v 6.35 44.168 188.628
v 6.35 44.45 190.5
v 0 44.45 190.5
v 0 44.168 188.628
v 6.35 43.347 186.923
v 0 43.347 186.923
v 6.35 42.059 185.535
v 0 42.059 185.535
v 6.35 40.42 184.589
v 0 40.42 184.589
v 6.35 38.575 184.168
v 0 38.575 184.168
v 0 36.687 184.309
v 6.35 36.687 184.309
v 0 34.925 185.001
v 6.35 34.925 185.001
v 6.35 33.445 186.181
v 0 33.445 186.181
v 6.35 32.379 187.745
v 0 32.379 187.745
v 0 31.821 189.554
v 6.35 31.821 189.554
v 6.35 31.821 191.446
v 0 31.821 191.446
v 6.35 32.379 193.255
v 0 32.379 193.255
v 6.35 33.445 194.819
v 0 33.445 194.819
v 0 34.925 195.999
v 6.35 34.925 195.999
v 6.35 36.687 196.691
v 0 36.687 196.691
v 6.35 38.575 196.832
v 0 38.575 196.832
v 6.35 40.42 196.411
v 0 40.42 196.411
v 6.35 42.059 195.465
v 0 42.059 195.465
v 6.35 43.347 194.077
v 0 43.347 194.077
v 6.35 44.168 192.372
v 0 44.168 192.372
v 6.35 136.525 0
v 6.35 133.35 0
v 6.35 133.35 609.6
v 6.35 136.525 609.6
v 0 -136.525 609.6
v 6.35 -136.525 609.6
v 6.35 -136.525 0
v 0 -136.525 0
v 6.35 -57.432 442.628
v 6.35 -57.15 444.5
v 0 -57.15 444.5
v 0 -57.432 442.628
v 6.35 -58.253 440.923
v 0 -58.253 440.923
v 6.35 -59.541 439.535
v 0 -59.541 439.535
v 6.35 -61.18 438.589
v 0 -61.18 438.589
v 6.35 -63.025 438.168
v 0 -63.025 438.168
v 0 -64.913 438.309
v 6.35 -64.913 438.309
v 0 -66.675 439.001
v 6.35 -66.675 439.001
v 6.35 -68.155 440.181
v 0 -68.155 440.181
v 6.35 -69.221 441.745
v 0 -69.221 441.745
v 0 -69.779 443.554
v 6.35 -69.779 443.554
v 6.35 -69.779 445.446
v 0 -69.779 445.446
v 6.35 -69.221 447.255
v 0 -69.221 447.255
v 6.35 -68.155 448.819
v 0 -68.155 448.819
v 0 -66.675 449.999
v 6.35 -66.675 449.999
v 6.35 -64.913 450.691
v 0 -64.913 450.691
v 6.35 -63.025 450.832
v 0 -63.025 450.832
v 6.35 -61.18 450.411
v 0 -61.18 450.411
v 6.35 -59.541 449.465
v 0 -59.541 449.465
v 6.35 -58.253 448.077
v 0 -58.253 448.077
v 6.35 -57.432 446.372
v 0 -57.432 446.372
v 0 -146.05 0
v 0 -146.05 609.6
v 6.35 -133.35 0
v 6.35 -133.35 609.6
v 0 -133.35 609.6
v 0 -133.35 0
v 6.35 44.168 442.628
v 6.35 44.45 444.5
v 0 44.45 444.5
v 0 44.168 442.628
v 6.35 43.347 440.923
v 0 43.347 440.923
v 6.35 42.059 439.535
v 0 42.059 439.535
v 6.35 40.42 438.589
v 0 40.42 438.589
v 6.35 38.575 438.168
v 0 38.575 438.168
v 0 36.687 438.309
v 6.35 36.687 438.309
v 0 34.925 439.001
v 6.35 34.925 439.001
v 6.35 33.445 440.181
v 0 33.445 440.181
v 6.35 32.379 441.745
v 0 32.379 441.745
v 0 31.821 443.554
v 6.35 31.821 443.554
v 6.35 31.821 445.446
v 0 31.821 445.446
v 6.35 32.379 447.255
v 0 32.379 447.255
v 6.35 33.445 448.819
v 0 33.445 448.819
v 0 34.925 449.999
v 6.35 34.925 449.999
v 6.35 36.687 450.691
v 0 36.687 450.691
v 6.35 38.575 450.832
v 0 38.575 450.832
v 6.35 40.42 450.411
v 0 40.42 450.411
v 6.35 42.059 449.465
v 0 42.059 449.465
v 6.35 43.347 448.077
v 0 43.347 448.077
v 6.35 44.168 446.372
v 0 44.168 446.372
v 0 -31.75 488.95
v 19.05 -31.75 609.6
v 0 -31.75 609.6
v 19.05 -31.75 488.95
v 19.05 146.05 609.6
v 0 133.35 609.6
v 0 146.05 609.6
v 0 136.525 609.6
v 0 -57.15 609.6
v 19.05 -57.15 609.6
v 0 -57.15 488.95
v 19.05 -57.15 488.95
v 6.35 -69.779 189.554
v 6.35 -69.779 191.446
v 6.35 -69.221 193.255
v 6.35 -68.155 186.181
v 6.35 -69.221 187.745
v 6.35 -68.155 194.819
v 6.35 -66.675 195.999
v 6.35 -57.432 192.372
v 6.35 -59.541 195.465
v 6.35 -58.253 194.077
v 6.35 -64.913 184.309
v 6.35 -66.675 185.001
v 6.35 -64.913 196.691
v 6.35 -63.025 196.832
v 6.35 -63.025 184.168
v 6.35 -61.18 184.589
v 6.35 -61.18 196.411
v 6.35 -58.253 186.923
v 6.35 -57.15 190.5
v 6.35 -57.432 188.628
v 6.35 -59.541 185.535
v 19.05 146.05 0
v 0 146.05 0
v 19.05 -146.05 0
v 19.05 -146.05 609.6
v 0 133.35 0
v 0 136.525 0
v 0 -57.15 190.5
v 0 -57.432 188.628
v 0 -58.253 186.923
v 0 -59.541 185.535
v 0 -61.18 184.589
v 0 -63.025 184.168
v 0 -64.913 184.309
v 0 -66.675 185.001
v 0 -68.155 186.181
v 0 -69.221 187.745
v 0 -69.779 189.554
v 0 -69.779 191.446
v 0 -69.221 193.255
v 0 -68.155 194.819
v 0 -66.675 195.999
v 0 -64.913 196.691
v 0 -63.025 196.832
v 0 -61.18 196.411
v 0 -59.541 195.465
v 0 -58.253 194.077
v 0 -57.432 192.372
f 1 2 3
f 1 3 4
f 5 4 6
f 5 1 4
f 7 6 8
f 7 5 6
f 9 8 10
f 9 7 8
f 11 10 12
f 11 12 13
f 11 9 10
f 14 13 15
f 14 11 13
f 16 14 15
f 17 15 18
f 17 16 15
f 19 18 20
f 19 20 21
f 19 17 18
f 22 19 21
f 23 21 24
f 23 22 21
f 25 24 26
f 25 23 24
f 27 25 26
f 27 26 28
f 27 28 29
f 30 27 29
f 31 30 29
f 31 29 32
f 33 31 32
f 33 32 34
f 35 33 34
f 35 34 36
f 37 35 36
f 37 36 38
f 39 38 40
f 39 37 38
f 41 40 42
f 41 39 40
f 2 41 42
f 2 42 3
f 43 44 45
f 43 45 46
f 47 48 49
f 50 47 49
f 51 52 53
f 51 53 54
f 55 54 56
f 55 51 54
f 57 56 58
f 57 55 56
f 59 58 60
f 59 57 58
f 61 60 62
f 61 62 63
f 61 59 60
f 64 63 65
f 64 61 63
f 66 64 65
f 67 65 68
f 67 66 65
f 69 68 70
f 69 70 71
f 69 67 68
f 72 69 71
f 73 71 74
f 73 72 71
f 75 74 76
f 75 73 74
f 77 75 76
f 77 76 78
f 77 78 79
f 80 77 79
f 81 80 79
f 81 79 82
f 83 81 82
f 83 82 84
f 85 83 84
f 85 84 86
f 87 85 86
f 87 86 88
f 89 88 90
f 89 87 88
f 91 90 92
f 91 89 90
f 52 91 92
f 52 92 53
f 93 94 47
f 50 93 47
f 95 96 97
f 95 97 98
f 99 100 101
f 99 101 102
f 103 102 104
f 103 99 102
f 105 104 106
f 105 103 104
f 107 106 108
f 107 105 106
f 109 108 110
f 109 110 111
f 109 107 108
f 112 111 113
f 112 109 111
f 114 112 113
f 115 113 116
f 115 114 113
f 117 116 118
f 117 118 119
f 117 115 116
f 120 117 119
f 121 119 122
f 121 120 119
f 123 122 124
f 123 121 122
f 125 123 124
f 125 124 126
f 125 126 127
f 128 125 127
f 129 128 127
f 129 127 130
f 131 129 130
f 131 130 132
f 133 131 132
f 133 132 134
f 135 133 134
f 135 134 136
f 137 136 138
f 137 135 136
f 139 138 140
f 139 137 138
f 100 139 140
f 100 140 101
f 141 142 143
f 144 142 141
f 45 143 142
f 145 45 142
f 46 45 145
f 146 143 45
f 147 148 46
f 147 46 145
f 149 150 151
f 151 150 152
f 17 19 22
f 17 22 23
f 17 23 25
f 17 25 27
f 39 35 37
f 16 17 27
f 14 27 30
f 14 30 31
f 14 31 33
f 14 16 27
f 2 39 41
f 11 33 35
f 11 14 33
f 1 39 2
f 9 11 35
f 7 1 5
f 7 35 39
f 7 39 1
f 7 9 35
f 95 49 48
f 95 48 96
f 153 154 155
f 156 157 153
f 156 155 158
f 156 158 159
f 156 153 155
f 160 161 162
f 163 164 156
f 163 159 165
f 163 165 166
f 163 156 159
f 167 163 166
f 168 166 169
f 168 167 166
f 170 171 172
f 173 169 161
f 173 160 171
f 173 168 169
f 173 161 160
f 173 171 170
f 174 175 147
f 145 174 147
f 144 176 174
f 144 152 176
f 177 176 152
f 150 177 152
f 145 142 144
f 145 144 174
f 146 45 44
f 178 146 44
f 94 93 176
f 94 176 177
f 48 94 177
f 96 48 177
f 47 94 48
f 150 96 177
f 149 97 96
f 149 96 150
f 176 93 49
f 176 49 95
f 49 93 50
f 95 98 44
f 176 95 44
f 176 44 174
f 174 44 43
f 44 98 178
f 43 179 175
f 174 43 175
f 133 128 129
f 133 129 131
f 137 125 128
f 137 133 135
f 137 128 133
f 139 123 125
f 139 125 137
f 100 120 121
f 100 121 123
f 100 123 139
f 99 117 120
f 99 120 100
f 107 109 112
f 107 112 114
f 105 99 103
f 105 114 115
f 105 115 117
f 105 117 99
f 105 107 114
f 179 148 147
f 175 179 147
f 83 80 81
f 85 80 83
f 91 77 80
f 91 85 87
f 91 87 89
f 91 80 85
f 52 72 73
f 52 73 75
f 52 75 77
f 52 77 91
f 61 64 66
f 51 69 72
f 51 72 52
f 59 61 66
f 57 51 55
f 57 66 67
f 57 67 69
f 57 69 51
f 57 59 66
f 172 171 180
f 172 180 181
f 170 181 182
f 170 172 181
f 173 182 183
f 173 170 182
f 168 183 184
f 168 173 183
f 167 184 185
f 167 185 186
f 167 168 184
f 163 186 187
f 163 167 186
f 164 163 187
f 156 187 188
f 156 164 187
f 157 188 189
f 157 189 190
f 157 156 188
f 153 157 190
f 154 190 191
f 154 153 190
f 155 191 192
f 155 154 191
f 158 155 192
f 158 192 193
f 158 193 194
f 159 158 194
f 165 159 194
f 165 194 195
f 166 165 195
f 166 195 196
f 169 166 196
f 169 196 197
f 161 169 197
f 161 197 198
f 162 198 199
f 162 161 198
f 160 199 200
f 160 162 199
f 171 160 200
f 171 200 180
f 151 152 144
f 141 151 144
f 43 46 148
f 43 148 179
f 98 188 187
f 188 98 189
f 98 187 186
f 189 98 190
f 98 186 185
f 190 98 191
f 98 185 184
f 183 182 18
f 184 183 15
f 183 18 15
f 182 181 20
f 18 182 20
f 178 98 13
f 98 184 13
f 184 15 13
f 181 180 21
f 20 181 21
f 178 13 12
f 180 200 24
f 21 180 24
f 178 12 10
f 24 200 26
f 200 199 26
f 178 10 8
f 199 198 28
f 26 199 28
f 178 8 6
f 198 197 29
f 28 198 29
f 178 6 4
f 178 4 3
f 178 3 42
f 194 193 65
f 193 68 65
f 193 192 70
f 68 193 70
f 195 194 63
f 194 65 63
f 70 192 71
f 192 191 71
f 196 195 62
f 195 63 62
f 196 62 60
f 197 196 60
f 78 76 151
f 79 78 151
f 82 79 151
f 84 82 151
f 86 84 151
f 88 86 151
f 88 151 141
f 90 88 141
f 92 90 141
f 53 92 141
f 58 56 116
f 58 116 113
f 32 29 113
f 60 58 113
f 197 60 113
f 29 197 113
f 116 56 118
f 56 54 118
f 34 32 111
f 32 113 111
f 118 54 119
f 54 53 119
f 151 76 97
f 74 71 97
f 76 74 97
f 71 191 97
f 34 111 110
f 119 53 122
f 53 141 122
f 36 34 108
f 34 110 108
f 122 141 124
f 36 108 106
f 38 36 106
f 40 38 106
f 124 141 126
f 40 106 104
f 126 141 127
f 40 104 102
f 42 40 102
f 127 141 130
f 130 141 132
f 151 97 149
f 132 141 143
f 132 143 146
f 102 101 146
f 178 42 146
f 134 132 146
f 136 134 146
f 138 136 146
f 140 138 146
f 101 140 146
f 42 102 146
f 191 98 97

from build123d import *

# Parameters (mm, degrees)
SKETCH_W          = 292.1
SKETCH_H          = 609.6
PAD_DEPTH         = 19.05
BOX_W             = 3.175
BOX_H             = 609.6
BOX_DEPTH         = 107.95
BOX001_W          = 3.175
BOX001_H          = 609.6
BOX001_DEPTH      = 6.35
CYLINDER_R        = 6.35
CYLINDER_DEPTH    = 6.35
CYLINDER001_R     = 6.35
CYLINDER001_DEPTH = 6.35
CYLINDER002_R     = 6.35
CYLINDER002_DEPTH = 6.35
CYLINDER003_R     = 6.35
CYLINDER003_DEPTH = 6.35
BOX002_W          = 25.4
BOX002_H          = 120.65
BOX002_DEPTH      = 19.05


with BuildPart() as part:
    # Sketch → Pad (new body)
    with BuildSketch(Plane.YZ):
        with Locations((0, 304.8)):
            Rectangle(SKETCH_W, SKETCH_H)
    extrude(amount=PAD_DEPTH)

    # Box → Box (cut)
    with BuildSketch(Plane(origin=(6.35, 133.35, 609.6), x_dir=(0, 1, 0), z_dir=(-1, 0, 0))):
        with Locations((1.5875, 304.8)):
            Rectangle(BOX_W, BOX_H)
    extrude(amount=BOX_DEPTH, mode=Mode.SUBTRACT)

    # Box001 → Box001 (cut)
    with BuildSketch(Plane(origin=(6.35, -136.525, 609.6), x_dir=(0, 1, 0), z_dir=(-1, 0, 0))):
        with Locations((1.5875, 304.8)):
            Rectangle(BOX001_W, BOX001_H)
    extrude(amount=BOX001_DEPTH, mode=Mode.SUBTRACT)

    # Cylinder → Cylinder (cut)
    with BuildSketch(Plane(origin=(6.35, -63.5, 444.5), x_dir=(0, 1, 0), z_dir=(-1, 0, 0))):
        Circle(CYLINDER_R)
    extrude(amount=CYLINDER_DEPTH, mode=Mode.SUBTRACT)

    # Cylinder001 → Cylinder001 (cut)
    with BuildSketch(Plane(origin=(6.35, 38.1, 444.5), x_dir=(0, 1, 0), z_dir=(-1, 0, 0))):
        Circle(CYLINDER001_R)
    extrude(amount=CYLINDER001_DEPTH, mode=Mode.SUBTRACT)

    # Cylinder002 → Cylinder002 (cut)
    with BuildSketch(Plane(origin=(6.35, 38.1, 190.5), x_dir=(0, 1, 0), z_dir=(-1, 0, 0))):
        Circle(CYLINDER002_R)
    extrude(amount=CYLINDER002_DEPTH, mode=Mode.SUBTRACT)

    # Cylinder003 → Cylinder003 (cut)
    with BuildSketch(Plane(origin=(6.35, -63.5, 190.5), x_dir=(0, 1, 0), z_dir=(-1, 0, 0))):
        Circle(CYLINDER003_R)
    extrude(amount=CYLINDER003_DEPTH, mode=Mode.SUBTRACT)

    # Box002 → Box002 (cut)
    with BuildSketch(Plane(origin=(19.05, -57.15, 609.6), x_dir=(0, 1, 0), z_dir=(-1, 0, 0))):
        with Locations((12.7, 60.325)):
            Rectangle(BOX002_W, BOX002_H)
    extrude(amount=BOX002_DEPTH, mode=Mode.SUBTRACT)


solid = part.part
